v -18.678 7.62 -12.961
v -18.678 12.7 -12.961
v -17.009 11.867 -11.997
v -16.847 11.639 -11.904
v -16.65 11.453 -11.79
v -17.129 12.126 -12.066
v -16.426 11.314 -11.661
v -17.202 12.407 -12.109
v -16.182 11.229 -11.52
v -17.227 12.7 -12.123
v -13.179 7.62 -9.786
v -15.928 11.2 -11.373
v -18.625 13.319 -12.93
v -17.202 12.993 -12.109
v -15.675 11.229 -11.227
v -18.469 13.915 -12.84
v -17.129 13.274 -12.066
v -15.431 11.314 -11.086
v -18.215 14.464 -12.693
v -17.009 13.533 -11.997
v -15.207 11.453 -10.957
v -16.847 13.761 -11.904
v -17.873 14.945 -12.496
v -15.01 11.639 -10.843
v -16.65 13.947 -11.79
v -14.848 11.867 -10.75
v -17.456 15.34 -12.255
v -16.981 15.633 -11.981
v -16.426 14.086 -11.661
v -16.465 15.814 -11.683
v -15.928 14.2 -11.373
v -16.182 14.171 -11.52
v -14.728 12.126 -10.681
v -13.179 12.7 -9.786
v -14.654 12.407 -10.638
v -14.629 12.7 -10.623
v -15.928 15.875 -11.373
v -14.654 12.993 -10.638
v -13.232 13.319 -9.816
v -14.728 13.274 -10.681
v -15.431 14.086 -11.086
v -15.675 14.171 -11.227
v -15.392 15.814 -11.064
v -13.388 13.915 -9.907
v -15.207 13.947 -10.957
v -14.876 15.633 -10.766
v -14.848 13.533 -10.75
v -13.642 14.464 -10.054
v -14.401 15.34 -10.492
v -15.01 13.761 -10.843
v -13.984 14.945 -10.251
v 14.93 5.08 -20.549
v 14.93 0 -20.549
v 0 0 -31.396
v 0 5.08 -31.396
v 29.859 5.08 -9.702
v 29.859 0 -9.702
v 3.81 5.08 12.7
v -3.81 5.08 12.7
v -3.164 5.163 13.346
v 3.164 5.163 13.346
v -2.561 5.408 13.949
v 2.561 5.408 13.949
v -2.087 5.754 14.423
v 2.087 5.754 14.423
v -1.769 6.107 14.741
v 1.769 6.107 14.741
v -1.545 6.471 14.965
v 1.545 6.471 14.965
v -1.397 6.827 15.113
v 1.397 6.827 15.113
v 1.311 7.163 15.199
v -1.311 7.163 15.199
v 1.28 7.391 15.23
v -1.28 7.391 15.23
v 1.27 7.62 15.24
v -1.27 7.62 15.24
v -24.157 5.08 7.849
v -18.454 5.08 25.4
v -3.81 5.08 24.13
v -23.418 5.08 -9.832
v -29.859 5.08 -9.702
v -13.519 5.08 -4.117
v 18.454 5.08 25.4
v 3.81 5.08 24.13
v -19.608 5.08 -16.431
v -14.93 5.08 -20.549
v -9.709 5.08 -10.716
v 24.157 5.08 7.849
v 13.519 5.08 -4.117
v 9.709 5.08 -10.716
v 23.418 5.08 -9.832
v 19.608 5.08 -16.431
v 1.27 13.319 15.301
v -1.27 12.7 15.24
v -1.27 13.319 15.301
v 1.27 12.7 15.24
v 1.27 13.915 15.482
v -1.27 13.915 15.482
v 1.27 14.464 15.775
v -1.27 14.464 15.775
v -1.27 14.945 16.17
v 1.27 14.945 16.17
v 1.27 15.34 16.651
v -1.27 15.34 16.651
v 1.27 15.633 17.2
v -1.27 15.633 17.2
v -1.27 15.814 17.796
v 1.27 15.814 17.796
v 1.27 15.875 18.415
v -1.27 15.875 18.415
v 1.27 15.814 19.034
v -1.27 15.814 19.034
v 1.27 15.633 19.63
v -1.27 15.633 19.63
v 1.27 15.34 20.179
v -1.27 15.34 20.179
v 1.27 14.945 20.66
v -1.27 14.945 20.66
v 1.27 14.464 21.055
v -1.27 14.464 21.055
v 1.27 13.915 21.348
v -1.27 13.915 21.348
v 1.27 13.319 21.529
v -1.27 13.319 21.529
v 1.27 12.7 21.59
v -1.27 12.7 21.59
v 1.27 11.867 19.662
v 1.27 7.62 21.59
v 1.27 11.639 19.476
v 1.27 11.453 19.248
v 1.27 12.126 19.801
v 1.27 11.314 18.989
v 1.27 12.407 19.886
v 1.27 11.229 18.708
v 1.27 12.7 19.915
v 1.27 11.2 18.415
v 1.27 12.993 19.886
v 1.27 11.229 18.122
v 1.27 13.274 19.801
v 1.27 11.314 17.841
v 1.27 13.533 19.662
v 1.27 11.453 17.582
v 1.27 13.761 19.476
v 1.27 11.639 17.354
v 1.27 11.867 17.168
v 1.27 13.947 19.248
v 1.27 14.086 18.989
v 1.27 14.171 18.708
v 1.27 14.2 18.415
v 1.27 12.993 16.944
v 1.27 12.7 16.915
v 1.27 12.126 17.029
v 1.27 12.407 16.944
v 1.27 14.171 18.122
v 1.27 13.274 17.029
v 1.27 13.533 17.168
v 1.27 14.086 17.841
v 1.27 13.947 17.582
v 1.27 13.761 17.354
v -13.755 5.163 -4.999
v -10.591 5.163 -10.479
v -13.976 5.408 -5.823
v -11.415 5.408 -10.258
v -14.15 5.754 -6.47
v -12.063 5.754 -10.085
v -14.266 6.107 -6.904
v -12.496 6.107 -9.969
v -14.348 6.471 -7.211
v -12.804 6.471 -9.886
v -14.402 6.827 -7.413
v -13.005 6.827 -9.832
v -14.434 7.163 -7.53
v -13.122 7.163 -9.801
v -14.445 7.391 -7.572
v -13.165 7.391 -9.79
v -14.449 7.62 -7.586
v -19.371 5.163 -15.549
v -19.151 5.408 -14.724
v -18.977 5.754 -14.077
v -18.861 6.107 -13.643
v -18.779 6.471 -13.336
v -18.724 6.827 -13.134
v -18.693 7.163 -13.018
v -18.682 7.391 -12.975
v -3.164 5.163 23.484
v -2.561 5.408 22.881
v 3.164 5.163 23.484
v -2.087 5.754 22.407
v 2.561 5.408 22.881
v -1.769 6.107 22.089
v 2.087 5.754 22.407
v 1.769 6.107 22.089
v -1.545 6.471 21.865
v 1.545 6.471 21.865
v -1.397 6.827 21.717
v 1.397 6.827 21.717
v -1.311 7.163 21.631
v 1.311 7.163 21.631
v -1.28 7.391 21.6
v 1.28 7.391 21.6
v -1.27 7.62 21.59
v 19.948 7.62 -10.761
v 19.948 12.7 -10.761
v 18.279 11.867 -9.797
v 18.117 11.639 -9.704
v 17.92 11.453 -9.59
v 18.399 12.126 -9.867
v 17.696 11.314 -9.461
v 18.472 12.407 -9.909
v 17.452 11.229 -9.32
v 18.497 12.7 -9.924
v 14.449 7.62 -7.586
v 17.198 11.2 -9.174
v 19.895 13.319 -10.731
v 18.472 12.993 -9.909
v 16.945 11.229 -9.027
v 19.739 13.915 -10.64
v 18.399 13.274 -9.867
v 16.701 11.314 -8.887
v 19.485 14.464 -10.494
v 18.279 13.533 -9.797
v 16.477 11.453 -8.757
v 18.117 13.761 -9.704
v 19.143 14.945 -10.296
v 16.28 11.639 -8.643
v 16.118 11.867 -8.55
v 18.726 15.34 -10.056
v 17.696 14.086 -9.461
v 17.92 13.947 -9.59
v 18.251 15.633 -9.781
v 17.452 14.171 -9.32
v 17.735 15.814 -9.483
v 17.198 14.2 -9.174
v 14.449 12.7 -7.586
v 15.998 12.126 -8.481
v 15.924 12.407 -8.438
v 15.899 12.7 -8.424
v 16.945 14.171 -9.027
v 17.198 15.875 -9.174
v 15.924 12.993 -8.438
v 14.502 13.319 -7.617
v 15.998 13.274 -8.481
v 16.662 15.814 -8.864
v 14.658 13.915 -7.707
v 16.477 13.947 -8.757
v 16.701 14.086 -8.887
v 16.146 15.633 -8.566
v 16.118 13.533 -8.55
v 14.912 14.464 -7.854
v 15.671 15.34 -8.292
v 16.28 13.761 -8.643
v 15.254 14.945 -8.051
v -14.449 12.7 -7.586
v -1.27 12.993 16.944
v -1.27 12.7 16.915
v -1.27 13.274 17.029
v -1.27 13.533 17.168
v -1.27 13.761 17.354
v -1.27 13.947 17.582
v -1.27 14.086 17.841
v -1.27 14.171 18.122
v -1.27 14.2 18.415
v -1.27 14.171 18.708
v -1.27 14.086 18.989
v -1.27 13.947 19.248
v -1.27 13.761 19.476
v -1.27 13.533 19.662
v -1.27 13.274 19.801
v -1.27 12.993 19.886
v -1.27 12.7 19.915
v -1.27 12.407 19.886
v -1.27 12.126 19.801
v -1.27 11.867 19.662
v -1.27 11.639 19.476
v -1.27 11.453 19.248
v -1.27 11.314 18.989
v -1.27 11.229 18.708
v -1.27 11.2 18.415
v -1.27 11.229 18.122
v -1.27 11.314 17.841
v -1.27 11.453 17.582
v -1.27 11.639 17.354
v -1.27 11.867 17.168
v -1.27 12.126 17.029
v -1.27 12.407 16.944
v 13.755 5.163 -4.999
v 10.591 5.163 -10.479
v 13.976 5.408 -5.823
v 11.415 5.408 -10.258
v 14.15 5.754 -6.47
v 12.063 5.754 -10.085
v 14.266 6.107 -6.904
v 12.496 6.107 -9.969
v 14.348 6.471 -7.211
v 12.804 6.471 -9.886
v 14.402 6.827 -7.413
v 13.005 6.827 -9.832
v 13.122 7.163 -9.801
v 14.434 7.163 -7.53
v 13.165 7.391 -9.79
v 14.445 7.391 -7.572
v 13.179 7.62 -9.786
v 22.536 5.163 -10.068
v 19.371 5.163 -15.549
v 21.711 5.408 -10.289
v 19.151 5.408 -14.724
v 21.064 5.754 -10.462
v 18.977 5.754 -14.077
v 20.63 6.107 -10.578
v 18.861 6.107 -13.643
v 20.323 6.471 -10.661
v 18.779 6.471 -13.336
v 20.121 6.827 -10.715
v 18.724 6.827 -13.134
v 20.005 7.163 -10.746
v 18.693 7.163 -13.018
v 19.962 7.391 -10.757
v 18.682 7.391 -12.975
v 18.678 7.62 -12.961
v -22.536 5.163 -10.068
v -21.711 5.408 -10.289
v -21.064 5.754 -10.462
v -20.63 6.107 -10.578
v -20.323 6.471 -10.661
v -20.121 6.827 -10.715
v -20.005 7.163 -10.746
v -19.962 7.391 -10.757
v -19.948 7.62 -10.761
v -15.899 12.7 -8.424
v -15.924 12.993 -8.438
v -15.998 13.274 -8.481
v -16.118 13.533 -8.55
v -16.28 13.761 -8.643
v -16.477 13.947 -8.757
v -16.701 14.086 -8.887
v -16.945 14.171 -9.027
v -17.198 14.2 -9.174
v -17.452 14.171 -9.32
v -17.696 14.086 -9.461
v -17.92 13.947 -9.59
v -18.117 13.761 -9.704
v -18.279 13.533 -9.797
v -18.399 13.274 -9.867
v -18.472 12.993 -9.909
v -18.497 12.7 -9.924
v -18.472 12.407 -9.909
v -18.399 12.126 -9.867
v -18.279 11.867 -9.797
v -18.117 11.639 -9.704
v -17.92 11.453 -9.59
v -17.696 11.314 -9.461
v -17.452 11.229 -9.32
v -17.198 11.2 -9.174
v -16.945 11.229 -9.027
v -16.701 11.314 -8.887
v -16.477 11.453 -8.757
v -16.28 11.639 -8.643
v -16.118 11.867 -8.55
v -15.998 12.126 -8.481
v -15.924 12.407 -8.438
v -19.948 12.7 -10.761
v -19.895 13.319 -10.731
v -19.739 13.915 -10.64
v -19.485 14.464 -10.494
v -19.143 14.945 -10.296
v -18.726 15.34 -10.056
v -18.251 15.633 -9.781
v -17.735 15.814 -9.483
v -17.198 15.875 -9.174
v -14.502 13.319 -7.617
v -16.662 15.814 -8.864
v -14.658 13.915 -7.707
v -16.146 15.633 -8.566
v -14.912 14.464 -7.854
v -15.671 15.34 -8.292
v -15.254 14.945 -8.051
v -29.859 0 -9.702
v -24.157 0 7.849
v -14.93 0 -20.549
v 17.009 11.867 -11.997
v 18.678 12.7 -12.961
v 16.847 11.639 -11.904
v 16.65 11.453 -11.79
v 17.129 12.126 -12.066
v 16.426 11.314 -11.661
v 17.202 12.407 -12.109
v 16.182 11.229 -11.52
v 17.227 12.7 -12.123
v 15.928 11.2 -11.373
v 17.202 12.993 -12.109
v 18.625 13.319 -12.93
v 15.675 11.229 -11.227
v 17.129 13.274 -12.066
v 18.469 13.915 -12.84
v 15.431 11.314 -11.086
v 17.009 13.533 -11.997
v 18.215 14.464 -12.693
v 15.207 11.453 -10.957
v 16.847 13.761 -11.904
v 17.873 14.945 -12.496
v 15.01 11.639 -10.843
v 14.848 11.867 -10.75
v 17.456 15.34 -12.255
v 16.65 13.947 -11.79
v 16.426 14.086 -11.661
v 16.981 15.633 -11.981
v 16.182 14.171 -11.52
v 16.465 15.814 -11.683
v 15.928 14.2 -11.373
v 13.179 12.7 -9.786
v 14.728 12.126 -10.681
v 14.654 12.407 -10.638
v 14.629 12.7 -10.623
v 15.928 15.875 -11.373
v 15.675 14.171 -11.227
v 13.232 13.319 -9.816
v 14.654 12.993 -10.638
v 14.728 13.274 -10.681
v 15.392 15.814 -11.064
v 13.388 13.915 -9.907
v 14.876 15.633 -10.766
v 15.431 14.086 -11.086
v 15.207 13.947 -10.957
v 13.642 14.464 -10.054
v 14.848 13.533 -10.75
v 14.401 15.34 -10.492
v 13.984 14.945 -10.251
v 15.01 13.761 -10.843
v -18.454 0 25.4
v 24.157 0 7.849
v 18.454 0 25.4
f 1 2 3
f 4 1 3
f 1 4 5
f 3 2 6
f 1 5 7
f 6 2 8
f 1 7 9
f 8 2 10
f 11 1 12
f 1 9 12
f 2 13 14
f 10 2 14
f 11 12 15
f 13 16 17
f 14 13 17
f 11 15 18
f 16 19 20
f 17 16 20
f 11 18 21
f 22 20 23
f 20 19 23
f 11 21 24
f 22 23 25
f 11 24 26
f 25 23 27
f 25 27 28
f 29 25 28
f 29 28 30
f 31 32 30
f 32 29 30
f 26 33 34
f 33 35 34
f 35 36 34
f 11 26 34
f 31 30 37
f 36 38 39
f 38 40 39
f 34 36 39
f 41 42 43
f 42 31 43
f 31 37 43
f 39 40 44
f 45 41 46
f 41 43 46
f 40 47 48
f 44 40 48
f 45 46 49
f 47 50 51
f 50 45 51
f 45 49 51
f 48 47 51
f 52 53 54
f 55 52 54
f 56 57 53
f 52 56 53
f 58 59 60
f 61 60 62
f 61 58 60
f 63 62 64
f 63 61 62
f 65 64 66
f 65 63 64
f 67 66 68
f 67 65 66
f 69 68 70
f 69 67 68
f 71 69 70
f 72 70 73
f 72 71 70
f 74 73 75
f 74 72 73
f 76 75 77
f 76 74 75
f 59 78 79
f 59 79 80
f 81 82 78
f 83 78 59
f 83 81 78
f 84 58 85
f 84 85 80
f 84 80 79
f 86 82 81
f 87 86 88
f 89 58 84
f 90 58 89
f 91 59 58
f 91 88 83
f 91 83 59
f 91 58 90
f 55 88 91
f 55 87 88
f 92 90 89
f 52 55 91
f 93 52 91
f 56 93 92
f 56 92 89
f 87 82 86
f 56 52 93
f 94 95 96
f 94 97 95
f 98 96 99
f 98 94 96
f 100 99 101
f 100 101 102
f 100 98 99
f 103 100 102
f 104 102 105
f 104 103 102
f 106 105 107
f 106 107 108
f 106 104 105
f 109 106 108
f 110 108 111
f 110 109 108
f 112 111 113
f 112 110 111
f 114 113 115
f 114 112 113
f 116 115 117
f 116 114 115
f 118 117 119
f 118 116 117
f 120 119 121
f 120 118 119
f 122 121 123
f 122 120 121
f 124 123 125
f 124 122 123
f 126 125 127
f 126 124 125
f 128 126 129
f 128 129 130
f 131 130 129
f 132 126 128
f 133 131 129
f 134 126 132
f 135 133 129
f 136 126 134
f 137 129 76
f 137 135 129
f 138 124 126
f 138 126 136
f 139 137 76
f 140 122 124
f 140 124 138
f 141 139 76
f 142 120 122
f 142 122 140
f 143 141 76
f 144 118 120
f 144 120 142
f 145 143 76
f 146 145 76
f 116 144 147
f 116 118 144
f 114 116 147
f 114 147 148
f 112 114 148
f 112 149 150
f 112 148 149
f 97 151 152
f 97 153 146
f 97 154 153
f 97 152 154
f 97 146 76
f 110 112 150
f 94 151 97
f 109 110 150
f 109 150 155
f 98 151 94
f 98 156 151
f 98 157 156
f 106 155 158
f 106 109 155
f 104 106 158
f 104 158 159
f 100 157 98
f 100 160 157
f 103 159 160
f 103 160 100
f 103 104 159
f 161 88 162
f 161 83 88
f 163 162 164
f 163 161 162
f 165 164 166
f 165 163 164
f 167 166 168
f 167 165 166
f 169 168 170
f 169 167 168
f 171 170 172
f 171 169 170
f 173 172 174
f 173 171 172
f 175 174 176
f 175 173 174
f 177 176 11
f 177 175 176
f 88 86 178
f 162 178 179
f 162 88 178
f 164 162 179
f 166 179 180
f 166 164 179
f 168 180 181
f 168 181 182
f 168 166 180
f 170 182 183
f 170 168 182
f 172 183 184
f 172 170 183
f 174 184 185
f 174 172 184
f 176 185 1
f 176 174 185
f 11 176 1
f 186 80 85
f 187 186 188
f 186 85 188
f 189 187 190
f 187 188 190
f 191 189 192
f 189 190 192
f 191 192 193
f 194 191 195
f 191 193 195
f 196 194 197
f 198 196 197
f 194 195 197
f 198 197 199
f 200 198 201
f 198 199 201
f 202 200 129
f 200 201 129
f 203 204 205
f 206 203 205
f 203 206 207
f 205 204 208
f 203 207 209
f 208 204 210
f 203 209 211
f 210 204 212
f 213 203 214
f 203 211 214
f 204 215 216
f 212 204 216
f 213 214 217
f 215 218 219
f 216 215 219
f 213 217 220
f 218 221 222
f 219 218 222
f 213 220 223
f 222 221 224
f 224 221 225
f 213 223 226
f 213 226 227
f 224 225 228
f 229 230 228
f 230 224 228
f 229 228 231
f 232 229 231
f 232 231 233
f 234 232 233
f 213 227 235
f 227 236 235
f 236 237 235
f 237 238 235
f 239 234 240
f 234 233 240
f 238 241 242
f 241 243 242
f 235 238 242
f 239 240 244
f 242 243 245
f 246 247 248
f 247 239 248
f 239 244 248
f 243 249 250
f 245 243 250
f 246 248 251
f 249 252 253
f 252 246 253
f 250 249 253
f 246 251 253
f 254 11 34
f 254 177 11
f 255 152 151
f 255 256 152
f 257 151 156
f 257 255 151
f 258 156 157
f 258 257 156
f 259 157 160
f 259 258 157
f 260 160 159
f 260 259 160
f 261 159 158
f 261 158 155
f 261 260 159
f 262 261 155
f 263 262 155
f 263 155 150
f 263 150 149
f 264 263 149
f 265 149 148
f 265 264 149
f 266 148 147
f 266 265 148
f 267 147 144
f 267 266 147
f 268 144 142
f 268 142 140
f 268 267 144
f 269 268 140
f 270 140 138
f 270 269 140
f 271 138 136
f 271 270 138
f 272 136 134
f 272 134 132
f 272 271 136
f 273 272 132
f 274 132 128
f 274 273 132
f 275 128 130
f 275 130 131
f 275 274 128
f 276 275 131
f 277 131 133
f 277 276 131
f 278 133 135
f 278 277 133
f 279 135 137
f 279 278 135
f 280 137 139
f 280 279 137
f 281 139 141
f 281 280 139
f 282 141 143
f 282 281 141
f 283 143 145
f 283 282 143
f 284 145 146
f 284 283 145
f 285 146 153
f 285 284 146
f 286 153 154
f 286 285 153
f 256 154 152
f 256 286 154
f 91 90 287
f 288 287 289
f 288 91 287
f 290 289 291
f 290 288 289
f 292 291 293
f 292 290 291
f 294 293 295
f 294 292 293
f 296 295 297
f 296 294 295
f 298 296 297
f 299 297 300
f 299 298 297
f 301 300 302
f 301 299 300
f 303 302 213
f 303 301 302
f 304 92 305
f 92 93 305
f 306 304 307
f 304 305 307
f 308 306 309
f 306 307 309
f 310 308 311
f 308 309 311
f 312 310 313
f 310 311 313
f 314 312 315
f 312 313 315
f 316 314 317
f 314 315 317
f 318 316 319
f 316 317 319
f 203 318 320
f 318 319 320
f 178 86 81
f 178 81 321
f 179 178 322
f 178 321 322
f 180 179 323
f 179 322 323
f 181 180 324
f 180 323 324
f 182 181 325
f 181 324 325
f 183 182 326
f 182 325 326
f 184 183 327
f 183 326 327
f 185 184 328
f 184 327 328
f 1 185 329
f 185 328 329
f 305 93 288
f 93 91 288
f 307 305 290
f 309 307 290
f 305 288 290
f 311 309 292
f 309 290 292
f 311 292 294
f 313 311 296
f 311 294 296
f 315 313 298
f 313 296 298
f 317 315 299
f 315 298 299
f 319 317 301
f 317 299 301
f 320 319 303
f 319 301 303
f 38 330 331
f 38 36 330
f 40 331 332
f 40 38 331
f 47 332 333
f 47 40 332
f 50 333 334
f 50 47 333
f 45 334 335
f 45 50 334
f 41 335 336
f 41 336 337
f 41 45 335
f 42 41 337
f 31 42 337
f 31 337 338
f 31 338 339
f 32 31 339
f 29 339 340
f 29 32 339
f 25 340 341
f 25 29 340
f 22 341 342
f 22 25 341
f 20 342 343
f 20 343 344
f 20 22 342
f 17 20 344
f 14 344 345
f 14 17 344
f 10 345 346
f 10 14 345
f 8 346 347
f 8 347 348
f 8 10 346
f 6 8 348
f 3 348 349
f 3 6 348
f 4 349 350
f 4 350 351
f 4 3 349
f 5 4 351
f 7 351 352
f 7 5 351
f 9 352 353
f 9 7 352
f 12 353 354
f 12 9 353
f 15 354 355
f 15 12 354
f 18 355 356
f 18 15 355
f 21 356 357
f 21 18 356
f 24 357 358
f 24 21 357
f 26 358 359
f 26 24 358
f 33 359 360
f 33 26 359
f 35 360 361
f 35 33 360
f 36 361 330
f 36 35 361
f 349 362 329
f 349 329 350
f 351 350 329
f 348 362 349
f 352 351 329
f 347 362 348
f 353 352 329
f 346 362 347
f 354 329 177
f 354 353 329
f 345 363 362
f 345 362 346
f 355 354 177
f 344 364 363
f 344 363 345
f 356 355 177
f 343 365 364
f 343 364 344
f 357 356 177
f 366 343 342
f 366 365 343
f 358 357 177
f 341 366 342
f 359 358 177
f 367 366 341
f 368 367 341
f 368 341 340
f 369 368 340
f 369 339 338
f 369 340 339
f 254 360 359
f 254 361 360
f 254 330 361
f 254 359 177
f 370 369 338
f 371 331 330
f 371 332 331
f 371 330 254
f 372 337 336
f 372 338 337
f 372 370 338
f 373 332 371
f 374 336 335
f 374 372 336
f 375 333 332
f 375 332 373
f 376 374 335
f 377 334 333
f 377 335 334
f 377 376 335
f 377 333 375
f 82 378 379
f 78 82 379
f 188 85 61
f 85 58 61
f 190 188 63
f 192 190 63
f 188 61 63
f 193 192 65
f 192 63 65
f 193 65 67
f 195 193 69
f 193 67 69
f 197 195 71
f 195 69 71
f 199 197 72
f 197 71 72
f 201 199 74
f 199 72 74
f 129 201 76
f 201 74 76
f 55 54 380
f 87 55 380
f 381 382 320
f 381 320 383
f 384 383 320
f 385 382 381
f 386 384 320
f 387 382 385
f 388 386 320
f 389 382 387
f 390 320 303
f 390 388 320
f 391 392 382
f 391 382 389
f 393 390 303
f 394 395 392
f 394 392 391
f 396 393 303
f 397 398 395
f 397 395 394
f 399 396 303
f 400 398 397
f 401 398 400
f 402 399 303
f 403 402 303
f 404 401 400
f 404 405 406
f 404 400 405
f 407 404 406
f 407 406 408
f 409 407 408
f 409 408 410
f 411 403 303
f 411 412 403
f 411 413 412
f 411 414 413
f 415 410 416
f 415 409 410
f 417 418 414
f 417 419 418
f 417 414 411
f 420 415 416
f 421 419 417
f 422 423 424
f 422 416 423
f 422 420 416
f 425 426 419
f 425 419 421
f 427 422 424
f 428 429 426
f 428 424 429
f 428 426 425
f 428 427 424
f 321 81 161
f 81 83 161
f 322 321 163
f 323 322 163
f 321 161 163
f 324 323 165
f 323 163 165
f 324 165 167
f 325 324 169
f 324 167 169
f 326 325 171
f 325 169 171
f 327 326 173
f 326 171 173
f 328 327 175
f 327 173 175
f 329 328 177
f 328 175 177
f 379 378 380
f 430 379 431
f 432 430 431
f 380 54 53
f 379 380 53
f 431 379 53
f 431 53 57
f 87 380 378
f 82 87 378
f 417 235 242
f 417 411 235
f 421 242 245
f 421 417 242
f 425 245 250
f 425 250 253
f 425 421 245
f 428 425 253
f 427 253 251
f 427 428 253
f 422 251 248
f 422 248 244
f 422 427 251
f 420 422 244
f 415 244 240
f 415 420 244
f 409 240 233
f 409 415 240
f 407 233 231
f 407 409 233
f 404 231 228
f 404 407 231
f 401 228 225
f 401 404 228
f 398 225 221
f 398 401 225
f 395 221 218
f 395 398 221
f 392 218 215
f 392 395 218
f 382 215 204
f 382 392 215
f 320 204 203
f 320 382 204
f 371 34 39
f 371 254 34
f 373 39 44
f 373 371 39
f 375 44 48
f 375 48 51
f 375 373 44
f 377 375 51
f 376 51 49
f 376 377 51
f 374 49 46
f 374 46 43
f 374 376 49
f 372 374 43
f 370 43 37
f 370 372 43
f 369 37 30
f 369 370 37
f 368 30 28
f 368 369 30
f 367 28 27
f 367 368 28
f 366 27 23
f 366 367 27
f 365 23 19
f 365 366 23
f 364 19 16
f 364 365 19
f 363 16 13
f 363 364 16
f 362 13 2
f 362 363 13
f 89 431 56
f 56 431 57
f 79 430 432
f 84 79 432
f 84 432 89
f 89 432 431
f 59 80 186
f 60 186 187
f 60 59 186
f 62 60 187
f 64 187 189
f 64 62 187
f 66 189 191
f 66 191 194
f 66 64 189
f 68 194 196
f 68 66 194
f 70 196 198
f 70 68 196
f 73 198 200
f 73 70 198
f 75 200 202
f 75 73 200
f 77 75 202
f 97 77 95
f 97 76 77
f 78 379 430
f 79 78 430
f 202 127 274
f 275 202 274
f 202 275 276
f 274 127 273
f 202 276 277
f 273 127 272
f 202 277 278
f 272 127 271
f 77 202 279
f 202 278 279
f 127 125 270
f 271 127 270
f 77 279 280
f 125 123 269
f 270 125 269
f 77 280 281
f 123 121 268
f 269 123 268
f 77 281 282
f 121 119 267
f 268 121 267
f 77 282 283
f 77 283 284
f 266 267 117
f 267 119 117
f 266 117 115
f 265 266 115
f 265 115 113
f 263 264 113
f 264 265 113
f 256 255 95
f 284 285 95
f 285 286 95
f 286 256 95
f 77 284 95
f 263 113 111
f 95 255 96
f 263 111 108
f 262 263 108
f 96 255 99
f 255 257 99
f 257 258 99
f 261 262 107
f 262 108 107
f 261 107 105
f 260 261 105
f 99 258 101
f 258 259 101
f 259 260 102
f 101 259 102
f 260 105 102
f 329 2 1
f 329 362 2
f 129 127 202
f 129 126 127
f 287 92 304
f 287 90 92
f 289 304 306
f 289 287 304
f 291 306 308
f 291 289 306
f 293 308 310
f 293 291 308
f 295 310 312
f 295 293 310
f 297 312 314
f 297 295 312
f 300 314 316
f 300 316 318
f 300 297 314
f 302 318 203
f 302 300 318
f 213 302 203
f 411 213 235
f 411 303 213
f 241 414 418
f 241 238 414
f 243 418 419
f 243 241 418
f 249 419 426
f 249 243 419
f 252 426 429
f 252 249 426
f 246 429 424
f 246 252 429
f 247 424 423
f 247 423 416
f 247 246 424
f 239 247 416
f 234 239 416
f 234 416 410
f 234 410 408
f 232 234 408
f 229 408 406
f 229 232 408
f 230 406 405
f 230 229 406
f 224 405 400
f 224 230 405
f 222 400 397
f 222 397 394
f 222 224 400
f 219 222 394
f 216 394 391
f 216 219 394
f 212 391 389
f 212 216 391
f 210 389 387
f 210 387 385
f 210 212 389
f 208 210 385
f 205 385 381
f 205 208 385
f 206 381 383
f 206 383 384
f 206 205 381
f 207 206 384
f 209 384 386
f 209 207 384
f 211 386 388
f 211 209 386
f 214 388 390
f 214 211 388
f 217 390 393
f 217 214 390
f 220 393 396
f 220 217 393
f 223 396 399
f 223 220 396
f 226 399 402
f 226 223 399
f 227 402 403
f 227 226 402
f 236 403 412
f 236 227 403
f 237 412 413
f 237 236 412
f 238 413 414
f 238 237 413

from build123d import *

# Parameters (mm, degrees)
SKETCH2_R                = 25.4
BOSS_EXTRUDE1_DEPTH      = 5.08
SKETCH3_R                = 1.5
BOSS_EXTRUDE2_DEPTH      = 1.27
FILLET1_R                = 2.54
CIRPATTERN1_COUNT        = 3
FILLET1_OF_CIRPATTERN1_R = 2.54


with BuildPart() as part:
    # Sketch2 → Boss-Extrude1 (new body)
    with BuildSketch(Plane(origin=(0, 0, 0), x_dir=(1, 0, 0), z_dir=(0, 1, 0))):
        Circle(SKETCH2_R)
        with BuildLine():
            ThreePointArc((-14.929745343, 20.549031704), (-2.12e-07, 25.4), (14.929745, 20.549031953))
            Line((14.929745, 20.549031953), (0, 31.396126628))
            Line((0, 31.396126628), (-14.929745343, 20.549031704))
        make_face()
        with BuildLine():
            ThreePointArc((-24.156835493, -7.84903172), (-24.156835512, 7.849031664), (-14.929745343, 20.549031704))
            Line((-14.929745343, 20.549031704), (-29.859490816, 9.701936686))
            Line((-29.859490816, 9.701936686), (-24.156835493, -7.84903172))
        make_face()
        with BuildLine():
            Line((-18.454180211, -25.4), (-1.11e-07, -25.4))
            ThreePointArc((-1.11e-07, -25.4), (-14.929745427, -20.549031644), (-24.156835493, -7.84903172))
            Line((-24.156835493, -7.84903172), (-18.454180211, -25.4))
        make_face()
        with BuildLine():
            Line((18.454180211, -25.4), (24.156835424, -7.849031932))
            ThreePointArc((24.156835424, -7.849031932), (14.929745246, -20.549031775), (-1.11e-07, -25.4))
            Line((-1.11e-07, -25.4), (18.454180211, -25.4))
        make_face()
        with BuildLine():
            Line((24.156835424, -7.849031932), (29.859490816, 9.701936686))
            Line((29.859490816, 9.701936686), (14.929745, 20.549031953))
            ThreePointArc((14.929745, 20.549031953), (22.6315656, 11.531358918), (25.4, 0))
            ThreePointArc((25.4, 0), (25.087283828, -3.973435555), (24.156835424, -7.849031932))
        make_face()
    extrude(amount=BOSS_EXTRUDE1_DEPTH)

    # Sketch3 → Boss-Extrude2 (add, symmetric)
    with BuildSketch(Plane(origin=(0, 0, 0), x_dir=(0, 0, -1), z_dir=(1, 0, 0))):
        with BuildLine():
            Line((-21.59, 12.7), (-21.59, 5.08))
            Line((-21.59, 5.08), (-15.24, 5.08))
            Line((-15.24, 5.08), (-15.24, 12.7))
            ThreePointArc((-15.24, 12.7), (-18.415, 15.875), (-21.59, 12.7))
        make_face()
        with Locations((-18.415, 12.7)):
            Circle(SKETCH3_R, mode=Mode.SUBTRACT)
    boss_extrude2 = extrude(amount=BOSS_EXTRUDE2_DEPTH, both=True)

    # Fillet1
    fillet1_edges = [part.edges().sort_by_distance(p)[0] for p in [
        (0, 5.08, 15.24),
        (-1.27, 5.08, 18.415),
        (0, 5.08, 21.59),
        (1.27, 5.08, 18.415),
    ]]
    fillet(fillet1_edges, radius=FILLET1_R)

    # CirPattern1: Boss-Extrude2 ×3 about axis
    cirpattern1_axis = Axis((0, 0, -0.710757359), (0, 1, 0))
    for i in range(1, CIRPATTERN1_COUNT):
        add(boss_extrude2.rotate(cirpattern1_axis, i * 360 / CIRPATTERN1_COUNT))

    # Fillet1 of CirPattern1
    fillet1_of_cirpattern1_edges = [part.edges().sort_by_distance(p)[0] for p in [
        (13.813761083, 5.08, -8.686136039),
        (17.19839174, 5.08, -9.173783776),
        (19.313022397, 5.08, -11.861136039),
        (15.92839174, 5.08, -11.373488302),
        (-13.813761083, 5.08, -8.686136039),
        (-15.92839174, 5.08, -11.373488302),
        (-19.313022397, 5.08, -11.861136039),
        (-17.19839174, 5.08, -9.173783776),
    ]]
    fillet(fillet1_of_cirpattern1_edges, radius=FILLET1_OF_CIRPATTERN1_R)


solid = part.part
